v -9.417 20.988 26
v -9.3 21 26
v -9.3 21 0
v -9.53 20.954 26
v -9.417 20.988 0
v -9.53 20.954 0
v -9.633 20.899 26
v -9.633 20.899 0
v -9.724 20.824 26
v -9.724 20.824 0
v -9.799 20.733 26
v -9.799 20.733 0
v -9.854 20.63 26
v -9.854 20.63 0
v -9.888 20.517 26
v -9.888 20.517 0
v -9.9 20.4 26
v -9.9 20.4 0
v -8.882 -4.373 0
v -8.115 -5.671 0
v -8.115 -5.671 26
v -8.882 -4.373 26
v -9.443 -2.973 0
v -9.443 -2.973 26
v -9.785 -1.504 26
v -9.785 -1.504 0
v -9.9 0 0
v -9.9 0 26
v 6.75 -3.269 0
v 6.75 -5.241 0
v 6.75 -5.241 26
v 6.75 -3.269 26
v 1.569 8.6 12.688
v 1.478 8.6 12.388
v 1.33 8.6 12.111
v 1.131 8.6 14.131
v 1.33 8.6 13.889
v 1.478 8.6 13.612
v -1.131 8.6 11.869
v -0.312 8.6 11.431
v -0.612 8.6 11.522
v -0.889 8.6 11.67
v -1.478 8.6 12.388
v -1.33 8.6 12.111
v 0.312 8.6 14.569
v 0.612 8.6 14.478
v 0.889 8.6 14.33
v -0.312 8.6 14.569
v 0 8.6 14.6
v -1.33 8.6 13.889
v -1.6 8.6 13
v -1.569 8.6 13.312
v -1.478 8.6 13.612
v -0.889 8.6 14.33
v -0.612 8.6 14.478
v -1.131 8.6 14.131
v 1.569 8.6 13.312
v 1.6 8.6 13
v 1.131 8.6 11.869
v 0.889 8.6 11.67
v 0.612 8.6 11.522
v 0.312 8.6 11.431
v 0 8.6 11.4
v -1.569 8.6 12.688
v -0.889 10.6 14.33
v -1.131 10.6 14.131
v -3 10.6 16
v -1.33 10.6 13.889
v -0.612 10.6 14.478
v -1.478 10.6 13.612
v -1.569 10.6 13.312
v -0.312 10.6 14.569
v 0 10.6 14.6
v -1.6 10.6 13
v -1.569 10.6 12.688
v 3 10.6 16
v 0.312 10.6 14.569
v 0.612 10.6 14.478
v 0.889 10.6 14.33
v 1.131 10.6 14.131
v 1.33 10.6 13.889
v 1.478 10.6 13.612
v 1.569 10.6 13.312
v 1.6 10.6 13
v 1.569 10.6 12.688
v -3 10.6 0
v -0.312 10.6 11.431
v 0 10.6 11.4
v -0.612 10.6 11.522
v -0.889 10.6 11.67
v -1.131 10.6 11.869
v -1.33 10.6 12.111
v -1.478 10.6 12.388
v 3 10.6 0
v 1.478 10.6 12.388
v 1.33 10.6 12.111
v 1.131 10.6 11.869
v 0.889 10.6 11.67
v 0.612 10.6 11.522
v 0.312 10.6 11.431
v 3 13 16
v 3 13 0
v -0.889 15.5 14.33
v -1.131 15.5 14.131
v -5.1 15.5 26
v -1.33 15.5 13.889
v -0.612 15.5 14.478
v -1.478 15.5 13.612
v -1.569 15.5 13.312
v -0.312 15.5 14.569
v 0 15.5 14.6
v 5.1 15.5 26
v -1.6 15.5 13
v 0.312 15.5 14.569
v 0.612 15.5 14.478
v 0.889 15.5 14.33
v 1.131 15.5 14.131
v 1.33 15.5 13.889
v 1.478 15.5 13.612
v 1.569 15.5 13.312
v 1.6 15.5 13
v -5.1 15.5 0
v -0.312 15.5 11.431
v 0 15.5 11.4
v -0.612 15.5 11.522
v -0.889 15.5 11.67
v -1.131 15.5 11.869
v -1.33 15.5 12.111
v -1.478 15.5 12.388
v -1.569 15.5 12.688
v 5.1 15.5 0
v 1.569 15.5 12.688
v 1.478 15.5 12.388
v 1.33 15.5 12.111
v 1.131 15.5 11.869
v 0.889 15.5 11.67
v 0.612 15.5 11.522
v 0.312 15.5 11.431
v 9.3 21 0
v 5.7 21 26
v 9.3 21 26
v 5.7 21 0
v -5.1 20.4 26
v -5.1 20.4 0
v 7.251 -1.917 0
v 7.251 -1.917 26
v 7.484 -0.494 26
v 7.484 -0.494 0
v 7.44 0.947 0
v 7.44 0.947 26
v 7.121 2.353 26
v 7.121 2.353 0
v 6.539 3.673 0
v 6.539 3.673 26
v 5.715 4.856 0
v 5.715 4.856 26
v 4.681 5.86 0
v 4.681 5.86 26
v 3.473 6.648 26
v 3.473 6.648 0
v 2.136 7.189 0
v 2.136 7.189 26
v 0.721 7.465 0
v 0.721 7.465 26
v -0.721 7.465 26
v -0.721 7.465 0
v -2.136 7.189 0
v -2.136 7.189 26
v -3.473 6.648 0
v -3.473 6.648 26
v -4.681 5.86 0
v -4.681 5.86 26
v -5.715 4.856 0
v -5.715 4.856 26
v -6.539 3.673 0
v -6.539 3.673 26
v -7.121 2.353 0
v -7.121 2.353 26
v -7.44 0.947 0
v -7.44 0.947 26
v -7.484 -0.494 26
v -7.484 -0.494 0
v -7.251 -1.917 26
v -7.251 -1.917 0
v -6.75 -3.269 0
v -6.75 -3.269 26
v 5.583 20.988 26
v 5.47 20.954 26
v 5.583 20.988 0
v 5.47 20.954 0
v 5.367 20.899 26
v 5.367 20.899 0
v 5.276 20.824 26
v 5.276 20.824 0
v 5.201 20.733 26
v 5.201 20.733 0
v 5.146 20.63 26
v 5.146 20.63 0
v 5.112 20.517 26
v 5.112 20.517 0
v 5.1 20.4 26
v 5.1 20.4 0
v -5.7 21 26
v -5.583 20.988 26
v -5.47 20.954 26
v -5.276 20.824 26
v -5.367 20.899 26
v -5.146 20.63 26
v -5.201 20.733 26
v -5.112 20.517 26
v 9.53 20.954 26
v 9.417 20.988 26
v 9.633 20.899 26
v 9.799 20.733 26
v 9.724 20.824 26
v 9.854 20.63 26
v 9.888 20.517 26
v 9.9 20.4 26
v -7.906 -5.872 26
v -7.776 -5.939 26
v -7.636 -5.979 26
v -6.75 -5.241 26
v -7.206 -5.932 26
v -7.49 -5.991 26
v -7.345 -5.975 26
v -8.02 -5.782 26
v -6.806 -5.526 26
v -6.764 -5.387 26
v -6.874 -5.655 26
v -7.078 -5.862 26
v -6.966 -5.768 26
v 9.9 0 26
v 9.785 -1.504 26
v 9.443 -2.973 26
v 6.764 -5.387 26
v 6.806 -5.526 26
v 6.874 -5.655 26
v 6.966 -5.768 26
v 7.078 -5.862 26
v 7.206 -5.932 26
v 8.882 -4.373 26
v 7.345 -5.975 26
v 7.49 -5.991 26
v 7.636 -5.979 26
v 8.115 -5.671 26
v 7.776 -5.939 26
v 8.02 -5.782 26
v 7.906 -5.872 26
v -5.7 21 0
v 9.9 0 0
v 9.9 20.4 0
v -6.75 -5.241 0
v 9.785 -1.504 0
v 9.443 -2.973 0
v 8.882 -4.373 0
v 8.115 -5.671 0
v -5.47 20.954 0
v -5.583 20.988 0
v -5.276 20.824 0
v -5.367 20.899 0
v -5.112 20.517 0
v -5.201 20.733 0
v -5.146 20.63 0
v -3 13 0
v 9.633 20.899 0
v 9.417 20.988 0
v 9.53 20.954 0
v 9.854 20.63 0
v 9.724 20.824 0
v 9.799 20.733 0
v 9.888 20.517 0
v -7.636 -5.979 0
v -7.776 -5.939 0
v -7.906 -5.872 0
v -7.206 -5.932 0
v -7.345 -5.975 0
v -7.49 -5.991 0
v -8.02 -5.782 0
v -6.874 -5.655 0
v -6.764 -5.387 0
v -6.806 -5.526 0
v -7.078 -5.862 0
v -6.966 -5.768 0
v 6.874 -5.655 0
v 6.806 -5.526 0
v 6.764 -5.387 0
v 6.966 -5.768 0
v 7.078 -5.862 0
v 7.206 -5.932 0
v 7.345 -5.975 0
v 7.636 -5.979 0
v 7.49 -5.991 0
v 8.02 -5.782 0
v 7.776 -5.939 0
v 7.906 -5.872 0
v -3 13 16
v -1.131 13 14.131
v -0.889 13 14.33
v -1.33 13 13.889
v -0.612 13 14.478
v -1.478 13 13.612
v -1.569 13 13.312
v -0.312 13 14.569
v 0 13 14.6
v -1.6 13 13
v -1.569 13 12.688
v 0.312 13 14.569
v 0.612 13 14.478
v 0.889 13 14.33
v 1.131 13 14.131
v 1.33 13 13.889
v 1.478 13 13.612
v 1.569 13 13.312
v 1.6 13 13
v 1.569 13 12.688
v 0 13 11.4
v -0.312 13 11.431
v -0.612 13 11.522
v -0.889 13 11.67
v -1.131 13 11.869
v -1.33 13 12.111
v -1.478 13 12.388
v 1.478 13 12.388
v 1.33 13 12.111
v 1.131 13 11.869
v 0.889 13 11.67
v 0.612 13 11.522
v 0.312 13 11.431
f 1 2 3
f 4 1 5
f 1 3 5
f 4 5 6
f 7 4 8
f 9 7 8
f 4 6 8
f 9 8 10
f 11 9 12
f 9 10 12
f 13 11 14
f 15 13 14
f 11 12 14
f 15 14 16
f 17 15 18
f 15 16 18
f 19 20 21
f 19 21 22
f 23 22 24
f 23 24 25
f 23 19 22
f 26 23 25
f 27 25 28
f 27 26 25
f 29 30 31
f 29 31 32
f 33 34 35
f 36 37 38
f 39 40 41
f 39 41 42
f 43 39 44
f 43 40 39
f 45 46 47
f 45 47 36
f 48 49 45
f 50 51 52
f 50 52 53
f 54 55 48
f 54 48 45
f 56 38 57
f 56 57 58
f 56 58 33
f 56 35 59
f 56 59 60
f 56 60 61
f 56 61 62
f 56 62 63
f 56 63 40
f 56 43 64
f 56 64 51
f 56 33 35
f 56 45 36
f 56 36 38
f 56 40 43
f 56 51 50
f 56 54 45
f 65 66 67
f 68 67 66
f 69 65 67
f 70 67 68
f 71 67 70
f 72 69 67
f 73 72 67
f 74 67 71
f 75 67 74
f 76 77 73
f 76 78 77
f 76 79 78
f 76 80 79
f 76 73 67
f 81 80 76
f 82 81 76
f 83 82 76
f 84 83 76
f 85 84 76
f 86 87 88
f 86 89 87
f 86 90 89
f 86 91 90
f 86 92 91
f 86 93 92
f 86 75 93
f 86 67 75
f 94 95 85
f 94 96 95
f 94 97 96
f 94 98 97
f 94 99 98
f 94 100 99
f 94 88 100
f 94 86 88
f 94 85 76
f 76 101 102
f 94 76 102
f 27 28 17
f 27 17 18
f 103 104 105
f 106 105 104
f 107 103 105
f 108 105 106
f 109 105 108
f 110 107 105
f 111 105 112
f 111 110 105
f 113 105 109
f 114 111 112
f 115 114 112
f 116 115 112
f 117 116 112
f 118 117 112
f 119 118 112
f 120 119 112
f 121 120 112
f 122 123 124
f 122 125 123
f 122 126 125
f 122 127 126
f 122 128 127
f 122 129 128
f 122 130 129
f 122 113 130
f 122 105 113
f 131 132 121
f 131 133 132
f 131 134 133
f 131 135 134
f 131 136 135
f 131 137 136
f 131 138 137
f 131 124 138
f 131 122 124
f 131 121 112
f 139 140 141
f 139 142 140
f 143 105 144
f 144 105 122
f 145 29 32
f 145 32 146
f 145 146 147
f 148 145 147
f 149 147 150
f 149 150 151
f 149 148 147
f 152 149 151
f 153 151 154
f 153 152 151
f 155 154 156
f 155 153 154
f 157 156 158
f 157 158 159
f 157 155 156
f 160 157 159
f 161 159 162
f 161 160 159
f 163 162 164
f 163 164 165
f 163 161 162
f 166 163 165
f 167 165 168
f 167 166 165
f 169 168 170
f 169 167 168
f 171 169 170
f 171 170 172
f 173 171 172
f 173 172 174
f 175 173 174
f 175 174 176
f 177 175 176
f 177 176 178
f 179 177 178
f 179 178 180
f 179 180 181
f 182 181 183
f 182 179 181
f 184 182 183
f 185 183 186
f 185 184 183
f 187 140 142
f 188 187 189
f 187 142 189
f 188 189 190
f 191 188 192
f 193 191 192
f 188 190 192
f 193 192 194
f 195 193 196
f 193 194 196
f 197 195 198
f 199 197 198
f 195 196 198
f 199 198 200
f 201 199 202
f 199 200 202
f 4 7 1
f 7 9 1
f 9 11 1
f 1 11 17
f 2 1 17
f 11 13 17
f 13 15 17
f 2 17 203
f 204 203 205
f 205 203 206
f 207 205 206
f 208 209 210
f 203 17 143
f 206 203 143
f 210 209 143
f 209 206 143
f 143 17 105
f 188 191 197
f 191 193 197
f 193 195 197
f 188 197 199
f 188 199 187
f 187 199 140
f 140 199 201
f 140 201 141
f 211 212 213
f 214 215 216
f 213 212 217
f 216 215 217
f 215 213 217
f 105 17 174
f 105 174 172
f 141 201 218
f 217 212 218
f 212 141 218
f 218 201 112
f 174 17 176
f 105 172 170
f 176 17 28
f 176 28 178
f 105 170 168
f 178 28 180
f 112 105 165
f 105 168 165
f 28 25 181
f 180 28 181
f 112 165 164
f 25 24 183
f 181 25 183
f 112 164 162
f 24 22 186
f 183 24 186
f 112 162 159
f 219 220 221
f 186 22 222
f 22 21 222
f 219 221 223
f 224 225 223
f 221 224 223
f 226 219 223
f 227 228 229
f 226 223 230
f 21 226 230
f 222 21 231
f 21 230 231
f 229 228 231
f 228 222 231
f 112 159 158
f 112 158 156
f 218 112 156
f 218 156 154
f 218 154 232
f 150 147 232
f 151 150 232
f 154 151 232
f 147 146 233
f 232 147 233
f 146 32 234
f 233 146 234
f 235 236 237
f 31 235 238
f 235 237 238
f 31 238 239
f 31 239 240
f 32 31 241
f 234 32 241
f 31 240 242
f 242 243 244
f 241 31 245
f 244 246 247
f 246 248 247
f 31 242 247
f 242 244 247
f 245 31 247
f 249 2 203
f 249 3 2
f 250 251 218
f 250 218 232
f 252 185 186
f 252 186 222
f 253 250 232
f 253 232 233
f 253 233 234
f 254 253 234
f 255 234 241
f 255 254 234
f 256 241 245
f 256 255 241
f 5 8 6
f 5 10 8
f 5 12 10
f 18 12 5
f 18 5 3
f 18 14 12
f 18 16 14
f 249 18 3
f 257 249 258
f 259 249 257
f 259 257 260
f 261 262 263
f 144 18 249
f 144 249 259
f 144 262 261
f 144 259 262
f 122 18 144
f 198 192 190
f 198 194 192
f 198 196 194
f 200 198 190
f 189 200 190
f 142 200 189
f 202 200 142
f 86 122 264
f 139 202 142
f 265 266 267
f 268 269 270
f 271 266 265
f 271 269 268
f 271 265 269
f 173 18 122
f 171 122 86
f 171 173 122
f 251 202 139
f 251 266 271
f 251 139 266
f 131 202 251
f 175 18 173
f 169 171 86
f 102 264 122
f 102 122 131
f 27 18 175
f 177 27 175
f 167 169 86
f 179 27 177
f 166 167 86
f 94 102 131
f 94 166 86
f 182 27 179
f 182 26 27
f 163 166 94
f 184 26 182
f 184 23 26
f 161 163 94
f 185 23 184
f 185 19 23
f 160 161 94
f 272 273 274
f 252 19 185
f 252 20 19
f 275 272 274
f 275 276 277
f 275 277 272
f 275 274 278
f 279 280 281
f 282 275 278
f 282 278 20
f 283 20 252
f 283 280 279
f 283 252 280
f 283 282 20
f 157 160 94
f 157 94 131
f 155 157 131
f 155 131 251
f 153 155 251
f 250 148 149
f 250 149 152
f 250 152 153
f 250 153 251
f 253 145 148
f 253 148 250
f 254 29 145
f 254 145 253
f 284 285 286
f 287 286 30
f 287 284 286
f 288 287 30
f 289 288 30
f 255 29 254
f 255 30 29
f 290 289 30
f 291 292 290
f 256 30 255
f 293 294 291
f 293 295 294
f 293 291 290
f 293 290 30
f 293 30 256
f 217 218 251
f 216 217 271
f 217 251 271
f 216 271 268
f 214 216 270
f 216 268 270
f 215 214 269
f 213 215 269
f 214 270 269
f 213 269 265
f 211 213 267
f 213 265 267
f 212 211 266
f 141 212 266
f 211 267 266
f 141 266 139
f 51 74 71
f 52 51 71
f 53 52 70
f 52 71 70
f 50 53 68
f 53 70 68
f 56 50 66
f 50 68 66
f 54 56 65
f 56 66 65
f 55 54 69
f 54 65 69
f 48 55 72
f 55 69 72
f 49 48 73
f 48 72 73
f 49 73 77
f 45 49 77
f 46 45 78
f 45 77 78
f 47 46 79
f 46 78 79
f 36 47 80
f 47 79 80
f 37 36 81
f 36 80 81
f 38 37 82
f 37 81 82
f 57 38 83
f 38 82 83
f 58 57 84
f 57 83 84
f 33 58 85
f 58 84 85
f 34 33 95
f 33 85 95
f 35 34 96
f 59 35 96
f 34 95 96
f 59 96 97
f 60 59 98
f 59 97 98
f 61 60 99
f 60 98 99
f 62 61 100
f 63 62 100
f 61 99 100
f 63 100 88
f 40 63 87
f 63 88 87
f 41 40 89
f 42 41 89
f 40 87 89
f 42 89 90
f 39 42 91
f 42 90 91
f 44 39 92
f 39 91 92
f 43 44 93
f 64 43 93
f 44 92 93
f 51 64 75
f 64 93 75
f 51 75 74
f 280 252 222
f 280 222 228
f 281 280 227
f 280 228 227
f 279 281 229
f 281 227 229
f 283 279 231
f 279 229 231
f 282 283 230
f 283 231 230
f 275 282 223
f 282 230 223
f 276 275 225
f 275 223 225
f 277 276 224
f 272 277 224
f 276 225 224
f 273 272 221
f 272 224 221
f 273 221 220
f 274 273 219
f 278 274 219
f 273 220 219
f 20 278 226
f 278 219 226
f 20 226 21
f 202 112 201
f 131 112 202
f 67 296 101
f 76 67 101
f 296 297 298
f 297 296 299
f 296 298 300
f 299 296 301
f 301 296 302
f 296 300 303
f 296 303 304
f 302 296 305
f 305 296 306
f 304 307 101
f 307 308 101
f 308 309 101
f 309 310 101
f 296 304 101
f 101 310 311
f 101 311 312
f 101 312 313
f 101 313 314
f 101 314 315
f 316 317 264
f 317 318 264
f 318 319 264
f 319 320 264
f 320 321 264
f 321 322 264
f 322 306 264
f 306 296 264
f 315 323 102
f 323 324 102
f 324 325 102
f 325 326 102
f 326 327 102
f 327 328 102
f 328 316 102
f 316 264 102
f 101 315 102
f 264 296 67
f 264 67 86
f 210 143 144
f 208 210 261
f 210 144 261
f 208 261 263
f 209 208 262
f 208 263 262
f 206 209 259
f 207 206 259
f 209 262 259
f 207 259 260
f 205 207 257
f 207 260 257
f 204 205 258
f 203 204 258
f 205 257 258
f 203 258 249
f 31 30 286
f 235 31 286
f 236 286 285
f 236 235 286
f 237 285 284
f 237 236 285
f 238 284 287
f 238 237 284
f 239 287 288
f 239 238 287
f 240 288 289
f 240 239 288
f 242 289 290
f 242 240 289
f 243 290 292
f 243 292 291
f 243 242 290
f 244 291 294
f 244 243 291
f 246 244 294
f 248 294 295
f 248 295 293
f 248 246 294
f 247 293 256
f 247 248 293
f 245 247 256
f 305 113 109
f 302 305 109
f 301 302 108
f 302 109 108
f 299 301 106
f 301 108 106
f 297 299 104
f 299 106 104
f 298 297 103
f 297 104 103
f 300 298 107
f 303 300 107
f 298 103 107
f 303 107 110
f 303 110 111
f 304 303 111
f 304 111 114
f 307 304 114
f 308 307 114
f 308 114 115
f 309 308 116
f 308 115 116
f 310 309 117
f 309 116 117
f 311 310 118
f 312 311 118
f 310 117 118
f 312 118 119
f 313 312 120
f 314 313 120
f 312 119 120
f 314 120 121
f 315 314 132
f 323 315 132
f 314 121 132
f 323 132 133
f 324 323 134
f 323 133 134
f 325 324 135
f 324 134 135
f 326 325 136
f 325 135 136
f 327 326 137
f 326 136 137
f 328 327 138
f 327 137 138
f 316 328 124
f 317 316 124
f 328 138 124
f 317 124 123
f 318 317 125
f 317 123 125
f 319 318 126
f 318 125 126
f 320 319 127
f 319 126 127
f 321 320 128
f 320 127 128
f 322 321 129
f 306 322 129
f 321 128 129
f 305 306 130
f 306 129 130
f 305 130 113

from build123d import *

# Parameters (mm, degrees)
DODANIE_WYCI_GNI_CIE1_DEPTH = 26
SZKIC2_W                    = 4.8
SZKIC2_H                    = 26
DODANIE_WYCI_GNI_CIE2_DEPTH = 5.5
ZAOKR_GLENIE1_R             = 0.75
SZKIC6_R                    = 1.6
WYTNIJ_WYCI_GNI_CIE3_DEPTH  = 2.5
SZKIC7_W                    = 6
SZKIC7_H                    = 16
WYTNIJ_WYCI_GNI_CIE4_DEPTH  = 2.4
SZKIC8_R                    = 1.6
WYTNIJ_WYCI_GNI_CIE5_DEPTH  = 2
ZAOKR_GLENIE2_R             = 0.6


with BuildPart() as part:
    # Szkic1 → Dodanie-wyciągnięcie1 (new body)
    with BuildSketch(Plane.XY):
        with BuildLine():
            Line((-6.75, -3.269174208), (-6.75, -7.242064623))
            ThreePointArc((-6.75, -7.242064623), (-9.078408451, -3.948733974), (-9.9, 0))
            Line((-9.9, 0), (-9.9, 15.5))
            Line((-9.9, 15.5), (9.9, 15.5))
            Line((9.9, 15.5), (9.9, 0))
            ThreePointArc((9.9, 0), (9.078408451, -3.948733974), (6.75, -7.242064623))
            Line((6.75, -7.242064623), (6.75, -3.269174208))
            ThreePointArc((6.75, -3.269174208), (0, 7.5), (-6.75, -3.269174208))
        make_face()
    extrude(amount=DODANIE_WYCI_GNI_CIE1_DEPTH)

    # Szkic2 → Dodanie-wyciągnięcie2 (add)
    with BuildSketch(Plane(origin=(0, 15.5, 0), x_dir=(1, 0, 0), z_dir=(0, 1, 0))):
        with Locations((-7.5, -13)):
            Rectangle(SZKIC2_W, SZKIC2_H)
        with Locations((7.5, -13)):
            Rectangle(SZKIC2_W, SZKIC2_H)
    extrude(amount=DODANIE_WYCI_GNI_CIE2_DEPTH)

    # Zaokrąglenie1
    zaokr_glenie1_edges = [part.edges().sort_by_distance(p)[0] for p in [
        (-6.75, -7.242064623, 13),
        (6.75, -7.242064623, 13),
    ]]
    fillet(zaokr_glenie1_edges, radius=ZAOKR_GLENIE1_R)

    # Szkic6 → Wytnij-wyciągnięcie3 (cut)
    with BuildSketch(Plane(origin=(0, 15.5, 0), x_dir=(1, 0, 0), z_dir=(0, 1, 0))):
        with Locations(Location((0, -13, 0), (0, 0, 180))):
            Circle(SZKIC6_R)
    extrude(amount=-WYTNIJ_WYCI_GNI_CIE3_DEPTH, mode=Mode.SUBTRACT)

    # Szkic7 → Wytnij-wyciągnięcie4 (cut)
    with BuildSketch(Plane(origin=(0, 13, 0), x_dir=(1, 0, 0), z_dir=(0, 1, 0))):
        with Locations((0, -8)):
            Rectangle(SZKIC7_W, SZKIC7_H)
    extrude(amount=-WYTNIJ_WYCI_GNI_CIE4_DEPTH, mode=Mode.SUBTRACT)

    # Szkic8 → Wytnij-wyciągnięcie5 (cut)
    with BuildSketch(Plane(origin=(0, 10.6, 0), x_dir=(1, 0, 0), z_dir=(0, 1, 0))):
        with Locations(Location((0, -13, 0), (0, 0, 180))):
            Circle(SZKIC8_R)
    extrude(amount=-WYTNIJ_WYCI_GNI_CIE5_DEPTH, mode=Mode.SUBTRACT)

    # Zaokrąglenie2
    zaokr_glenie2_edges = [part.edges().sort_by_distance(p)[0] for p in [
        (-5.1, 21, 13),
        (-9.9, 21, 13),
        (5.1, 21, 13),
        (9.9, 21, 13),
    ]]
    fillet(zaokr_glenie2_edges, radius=ZAOKR_GLENIE2_R)


solid = part.part
